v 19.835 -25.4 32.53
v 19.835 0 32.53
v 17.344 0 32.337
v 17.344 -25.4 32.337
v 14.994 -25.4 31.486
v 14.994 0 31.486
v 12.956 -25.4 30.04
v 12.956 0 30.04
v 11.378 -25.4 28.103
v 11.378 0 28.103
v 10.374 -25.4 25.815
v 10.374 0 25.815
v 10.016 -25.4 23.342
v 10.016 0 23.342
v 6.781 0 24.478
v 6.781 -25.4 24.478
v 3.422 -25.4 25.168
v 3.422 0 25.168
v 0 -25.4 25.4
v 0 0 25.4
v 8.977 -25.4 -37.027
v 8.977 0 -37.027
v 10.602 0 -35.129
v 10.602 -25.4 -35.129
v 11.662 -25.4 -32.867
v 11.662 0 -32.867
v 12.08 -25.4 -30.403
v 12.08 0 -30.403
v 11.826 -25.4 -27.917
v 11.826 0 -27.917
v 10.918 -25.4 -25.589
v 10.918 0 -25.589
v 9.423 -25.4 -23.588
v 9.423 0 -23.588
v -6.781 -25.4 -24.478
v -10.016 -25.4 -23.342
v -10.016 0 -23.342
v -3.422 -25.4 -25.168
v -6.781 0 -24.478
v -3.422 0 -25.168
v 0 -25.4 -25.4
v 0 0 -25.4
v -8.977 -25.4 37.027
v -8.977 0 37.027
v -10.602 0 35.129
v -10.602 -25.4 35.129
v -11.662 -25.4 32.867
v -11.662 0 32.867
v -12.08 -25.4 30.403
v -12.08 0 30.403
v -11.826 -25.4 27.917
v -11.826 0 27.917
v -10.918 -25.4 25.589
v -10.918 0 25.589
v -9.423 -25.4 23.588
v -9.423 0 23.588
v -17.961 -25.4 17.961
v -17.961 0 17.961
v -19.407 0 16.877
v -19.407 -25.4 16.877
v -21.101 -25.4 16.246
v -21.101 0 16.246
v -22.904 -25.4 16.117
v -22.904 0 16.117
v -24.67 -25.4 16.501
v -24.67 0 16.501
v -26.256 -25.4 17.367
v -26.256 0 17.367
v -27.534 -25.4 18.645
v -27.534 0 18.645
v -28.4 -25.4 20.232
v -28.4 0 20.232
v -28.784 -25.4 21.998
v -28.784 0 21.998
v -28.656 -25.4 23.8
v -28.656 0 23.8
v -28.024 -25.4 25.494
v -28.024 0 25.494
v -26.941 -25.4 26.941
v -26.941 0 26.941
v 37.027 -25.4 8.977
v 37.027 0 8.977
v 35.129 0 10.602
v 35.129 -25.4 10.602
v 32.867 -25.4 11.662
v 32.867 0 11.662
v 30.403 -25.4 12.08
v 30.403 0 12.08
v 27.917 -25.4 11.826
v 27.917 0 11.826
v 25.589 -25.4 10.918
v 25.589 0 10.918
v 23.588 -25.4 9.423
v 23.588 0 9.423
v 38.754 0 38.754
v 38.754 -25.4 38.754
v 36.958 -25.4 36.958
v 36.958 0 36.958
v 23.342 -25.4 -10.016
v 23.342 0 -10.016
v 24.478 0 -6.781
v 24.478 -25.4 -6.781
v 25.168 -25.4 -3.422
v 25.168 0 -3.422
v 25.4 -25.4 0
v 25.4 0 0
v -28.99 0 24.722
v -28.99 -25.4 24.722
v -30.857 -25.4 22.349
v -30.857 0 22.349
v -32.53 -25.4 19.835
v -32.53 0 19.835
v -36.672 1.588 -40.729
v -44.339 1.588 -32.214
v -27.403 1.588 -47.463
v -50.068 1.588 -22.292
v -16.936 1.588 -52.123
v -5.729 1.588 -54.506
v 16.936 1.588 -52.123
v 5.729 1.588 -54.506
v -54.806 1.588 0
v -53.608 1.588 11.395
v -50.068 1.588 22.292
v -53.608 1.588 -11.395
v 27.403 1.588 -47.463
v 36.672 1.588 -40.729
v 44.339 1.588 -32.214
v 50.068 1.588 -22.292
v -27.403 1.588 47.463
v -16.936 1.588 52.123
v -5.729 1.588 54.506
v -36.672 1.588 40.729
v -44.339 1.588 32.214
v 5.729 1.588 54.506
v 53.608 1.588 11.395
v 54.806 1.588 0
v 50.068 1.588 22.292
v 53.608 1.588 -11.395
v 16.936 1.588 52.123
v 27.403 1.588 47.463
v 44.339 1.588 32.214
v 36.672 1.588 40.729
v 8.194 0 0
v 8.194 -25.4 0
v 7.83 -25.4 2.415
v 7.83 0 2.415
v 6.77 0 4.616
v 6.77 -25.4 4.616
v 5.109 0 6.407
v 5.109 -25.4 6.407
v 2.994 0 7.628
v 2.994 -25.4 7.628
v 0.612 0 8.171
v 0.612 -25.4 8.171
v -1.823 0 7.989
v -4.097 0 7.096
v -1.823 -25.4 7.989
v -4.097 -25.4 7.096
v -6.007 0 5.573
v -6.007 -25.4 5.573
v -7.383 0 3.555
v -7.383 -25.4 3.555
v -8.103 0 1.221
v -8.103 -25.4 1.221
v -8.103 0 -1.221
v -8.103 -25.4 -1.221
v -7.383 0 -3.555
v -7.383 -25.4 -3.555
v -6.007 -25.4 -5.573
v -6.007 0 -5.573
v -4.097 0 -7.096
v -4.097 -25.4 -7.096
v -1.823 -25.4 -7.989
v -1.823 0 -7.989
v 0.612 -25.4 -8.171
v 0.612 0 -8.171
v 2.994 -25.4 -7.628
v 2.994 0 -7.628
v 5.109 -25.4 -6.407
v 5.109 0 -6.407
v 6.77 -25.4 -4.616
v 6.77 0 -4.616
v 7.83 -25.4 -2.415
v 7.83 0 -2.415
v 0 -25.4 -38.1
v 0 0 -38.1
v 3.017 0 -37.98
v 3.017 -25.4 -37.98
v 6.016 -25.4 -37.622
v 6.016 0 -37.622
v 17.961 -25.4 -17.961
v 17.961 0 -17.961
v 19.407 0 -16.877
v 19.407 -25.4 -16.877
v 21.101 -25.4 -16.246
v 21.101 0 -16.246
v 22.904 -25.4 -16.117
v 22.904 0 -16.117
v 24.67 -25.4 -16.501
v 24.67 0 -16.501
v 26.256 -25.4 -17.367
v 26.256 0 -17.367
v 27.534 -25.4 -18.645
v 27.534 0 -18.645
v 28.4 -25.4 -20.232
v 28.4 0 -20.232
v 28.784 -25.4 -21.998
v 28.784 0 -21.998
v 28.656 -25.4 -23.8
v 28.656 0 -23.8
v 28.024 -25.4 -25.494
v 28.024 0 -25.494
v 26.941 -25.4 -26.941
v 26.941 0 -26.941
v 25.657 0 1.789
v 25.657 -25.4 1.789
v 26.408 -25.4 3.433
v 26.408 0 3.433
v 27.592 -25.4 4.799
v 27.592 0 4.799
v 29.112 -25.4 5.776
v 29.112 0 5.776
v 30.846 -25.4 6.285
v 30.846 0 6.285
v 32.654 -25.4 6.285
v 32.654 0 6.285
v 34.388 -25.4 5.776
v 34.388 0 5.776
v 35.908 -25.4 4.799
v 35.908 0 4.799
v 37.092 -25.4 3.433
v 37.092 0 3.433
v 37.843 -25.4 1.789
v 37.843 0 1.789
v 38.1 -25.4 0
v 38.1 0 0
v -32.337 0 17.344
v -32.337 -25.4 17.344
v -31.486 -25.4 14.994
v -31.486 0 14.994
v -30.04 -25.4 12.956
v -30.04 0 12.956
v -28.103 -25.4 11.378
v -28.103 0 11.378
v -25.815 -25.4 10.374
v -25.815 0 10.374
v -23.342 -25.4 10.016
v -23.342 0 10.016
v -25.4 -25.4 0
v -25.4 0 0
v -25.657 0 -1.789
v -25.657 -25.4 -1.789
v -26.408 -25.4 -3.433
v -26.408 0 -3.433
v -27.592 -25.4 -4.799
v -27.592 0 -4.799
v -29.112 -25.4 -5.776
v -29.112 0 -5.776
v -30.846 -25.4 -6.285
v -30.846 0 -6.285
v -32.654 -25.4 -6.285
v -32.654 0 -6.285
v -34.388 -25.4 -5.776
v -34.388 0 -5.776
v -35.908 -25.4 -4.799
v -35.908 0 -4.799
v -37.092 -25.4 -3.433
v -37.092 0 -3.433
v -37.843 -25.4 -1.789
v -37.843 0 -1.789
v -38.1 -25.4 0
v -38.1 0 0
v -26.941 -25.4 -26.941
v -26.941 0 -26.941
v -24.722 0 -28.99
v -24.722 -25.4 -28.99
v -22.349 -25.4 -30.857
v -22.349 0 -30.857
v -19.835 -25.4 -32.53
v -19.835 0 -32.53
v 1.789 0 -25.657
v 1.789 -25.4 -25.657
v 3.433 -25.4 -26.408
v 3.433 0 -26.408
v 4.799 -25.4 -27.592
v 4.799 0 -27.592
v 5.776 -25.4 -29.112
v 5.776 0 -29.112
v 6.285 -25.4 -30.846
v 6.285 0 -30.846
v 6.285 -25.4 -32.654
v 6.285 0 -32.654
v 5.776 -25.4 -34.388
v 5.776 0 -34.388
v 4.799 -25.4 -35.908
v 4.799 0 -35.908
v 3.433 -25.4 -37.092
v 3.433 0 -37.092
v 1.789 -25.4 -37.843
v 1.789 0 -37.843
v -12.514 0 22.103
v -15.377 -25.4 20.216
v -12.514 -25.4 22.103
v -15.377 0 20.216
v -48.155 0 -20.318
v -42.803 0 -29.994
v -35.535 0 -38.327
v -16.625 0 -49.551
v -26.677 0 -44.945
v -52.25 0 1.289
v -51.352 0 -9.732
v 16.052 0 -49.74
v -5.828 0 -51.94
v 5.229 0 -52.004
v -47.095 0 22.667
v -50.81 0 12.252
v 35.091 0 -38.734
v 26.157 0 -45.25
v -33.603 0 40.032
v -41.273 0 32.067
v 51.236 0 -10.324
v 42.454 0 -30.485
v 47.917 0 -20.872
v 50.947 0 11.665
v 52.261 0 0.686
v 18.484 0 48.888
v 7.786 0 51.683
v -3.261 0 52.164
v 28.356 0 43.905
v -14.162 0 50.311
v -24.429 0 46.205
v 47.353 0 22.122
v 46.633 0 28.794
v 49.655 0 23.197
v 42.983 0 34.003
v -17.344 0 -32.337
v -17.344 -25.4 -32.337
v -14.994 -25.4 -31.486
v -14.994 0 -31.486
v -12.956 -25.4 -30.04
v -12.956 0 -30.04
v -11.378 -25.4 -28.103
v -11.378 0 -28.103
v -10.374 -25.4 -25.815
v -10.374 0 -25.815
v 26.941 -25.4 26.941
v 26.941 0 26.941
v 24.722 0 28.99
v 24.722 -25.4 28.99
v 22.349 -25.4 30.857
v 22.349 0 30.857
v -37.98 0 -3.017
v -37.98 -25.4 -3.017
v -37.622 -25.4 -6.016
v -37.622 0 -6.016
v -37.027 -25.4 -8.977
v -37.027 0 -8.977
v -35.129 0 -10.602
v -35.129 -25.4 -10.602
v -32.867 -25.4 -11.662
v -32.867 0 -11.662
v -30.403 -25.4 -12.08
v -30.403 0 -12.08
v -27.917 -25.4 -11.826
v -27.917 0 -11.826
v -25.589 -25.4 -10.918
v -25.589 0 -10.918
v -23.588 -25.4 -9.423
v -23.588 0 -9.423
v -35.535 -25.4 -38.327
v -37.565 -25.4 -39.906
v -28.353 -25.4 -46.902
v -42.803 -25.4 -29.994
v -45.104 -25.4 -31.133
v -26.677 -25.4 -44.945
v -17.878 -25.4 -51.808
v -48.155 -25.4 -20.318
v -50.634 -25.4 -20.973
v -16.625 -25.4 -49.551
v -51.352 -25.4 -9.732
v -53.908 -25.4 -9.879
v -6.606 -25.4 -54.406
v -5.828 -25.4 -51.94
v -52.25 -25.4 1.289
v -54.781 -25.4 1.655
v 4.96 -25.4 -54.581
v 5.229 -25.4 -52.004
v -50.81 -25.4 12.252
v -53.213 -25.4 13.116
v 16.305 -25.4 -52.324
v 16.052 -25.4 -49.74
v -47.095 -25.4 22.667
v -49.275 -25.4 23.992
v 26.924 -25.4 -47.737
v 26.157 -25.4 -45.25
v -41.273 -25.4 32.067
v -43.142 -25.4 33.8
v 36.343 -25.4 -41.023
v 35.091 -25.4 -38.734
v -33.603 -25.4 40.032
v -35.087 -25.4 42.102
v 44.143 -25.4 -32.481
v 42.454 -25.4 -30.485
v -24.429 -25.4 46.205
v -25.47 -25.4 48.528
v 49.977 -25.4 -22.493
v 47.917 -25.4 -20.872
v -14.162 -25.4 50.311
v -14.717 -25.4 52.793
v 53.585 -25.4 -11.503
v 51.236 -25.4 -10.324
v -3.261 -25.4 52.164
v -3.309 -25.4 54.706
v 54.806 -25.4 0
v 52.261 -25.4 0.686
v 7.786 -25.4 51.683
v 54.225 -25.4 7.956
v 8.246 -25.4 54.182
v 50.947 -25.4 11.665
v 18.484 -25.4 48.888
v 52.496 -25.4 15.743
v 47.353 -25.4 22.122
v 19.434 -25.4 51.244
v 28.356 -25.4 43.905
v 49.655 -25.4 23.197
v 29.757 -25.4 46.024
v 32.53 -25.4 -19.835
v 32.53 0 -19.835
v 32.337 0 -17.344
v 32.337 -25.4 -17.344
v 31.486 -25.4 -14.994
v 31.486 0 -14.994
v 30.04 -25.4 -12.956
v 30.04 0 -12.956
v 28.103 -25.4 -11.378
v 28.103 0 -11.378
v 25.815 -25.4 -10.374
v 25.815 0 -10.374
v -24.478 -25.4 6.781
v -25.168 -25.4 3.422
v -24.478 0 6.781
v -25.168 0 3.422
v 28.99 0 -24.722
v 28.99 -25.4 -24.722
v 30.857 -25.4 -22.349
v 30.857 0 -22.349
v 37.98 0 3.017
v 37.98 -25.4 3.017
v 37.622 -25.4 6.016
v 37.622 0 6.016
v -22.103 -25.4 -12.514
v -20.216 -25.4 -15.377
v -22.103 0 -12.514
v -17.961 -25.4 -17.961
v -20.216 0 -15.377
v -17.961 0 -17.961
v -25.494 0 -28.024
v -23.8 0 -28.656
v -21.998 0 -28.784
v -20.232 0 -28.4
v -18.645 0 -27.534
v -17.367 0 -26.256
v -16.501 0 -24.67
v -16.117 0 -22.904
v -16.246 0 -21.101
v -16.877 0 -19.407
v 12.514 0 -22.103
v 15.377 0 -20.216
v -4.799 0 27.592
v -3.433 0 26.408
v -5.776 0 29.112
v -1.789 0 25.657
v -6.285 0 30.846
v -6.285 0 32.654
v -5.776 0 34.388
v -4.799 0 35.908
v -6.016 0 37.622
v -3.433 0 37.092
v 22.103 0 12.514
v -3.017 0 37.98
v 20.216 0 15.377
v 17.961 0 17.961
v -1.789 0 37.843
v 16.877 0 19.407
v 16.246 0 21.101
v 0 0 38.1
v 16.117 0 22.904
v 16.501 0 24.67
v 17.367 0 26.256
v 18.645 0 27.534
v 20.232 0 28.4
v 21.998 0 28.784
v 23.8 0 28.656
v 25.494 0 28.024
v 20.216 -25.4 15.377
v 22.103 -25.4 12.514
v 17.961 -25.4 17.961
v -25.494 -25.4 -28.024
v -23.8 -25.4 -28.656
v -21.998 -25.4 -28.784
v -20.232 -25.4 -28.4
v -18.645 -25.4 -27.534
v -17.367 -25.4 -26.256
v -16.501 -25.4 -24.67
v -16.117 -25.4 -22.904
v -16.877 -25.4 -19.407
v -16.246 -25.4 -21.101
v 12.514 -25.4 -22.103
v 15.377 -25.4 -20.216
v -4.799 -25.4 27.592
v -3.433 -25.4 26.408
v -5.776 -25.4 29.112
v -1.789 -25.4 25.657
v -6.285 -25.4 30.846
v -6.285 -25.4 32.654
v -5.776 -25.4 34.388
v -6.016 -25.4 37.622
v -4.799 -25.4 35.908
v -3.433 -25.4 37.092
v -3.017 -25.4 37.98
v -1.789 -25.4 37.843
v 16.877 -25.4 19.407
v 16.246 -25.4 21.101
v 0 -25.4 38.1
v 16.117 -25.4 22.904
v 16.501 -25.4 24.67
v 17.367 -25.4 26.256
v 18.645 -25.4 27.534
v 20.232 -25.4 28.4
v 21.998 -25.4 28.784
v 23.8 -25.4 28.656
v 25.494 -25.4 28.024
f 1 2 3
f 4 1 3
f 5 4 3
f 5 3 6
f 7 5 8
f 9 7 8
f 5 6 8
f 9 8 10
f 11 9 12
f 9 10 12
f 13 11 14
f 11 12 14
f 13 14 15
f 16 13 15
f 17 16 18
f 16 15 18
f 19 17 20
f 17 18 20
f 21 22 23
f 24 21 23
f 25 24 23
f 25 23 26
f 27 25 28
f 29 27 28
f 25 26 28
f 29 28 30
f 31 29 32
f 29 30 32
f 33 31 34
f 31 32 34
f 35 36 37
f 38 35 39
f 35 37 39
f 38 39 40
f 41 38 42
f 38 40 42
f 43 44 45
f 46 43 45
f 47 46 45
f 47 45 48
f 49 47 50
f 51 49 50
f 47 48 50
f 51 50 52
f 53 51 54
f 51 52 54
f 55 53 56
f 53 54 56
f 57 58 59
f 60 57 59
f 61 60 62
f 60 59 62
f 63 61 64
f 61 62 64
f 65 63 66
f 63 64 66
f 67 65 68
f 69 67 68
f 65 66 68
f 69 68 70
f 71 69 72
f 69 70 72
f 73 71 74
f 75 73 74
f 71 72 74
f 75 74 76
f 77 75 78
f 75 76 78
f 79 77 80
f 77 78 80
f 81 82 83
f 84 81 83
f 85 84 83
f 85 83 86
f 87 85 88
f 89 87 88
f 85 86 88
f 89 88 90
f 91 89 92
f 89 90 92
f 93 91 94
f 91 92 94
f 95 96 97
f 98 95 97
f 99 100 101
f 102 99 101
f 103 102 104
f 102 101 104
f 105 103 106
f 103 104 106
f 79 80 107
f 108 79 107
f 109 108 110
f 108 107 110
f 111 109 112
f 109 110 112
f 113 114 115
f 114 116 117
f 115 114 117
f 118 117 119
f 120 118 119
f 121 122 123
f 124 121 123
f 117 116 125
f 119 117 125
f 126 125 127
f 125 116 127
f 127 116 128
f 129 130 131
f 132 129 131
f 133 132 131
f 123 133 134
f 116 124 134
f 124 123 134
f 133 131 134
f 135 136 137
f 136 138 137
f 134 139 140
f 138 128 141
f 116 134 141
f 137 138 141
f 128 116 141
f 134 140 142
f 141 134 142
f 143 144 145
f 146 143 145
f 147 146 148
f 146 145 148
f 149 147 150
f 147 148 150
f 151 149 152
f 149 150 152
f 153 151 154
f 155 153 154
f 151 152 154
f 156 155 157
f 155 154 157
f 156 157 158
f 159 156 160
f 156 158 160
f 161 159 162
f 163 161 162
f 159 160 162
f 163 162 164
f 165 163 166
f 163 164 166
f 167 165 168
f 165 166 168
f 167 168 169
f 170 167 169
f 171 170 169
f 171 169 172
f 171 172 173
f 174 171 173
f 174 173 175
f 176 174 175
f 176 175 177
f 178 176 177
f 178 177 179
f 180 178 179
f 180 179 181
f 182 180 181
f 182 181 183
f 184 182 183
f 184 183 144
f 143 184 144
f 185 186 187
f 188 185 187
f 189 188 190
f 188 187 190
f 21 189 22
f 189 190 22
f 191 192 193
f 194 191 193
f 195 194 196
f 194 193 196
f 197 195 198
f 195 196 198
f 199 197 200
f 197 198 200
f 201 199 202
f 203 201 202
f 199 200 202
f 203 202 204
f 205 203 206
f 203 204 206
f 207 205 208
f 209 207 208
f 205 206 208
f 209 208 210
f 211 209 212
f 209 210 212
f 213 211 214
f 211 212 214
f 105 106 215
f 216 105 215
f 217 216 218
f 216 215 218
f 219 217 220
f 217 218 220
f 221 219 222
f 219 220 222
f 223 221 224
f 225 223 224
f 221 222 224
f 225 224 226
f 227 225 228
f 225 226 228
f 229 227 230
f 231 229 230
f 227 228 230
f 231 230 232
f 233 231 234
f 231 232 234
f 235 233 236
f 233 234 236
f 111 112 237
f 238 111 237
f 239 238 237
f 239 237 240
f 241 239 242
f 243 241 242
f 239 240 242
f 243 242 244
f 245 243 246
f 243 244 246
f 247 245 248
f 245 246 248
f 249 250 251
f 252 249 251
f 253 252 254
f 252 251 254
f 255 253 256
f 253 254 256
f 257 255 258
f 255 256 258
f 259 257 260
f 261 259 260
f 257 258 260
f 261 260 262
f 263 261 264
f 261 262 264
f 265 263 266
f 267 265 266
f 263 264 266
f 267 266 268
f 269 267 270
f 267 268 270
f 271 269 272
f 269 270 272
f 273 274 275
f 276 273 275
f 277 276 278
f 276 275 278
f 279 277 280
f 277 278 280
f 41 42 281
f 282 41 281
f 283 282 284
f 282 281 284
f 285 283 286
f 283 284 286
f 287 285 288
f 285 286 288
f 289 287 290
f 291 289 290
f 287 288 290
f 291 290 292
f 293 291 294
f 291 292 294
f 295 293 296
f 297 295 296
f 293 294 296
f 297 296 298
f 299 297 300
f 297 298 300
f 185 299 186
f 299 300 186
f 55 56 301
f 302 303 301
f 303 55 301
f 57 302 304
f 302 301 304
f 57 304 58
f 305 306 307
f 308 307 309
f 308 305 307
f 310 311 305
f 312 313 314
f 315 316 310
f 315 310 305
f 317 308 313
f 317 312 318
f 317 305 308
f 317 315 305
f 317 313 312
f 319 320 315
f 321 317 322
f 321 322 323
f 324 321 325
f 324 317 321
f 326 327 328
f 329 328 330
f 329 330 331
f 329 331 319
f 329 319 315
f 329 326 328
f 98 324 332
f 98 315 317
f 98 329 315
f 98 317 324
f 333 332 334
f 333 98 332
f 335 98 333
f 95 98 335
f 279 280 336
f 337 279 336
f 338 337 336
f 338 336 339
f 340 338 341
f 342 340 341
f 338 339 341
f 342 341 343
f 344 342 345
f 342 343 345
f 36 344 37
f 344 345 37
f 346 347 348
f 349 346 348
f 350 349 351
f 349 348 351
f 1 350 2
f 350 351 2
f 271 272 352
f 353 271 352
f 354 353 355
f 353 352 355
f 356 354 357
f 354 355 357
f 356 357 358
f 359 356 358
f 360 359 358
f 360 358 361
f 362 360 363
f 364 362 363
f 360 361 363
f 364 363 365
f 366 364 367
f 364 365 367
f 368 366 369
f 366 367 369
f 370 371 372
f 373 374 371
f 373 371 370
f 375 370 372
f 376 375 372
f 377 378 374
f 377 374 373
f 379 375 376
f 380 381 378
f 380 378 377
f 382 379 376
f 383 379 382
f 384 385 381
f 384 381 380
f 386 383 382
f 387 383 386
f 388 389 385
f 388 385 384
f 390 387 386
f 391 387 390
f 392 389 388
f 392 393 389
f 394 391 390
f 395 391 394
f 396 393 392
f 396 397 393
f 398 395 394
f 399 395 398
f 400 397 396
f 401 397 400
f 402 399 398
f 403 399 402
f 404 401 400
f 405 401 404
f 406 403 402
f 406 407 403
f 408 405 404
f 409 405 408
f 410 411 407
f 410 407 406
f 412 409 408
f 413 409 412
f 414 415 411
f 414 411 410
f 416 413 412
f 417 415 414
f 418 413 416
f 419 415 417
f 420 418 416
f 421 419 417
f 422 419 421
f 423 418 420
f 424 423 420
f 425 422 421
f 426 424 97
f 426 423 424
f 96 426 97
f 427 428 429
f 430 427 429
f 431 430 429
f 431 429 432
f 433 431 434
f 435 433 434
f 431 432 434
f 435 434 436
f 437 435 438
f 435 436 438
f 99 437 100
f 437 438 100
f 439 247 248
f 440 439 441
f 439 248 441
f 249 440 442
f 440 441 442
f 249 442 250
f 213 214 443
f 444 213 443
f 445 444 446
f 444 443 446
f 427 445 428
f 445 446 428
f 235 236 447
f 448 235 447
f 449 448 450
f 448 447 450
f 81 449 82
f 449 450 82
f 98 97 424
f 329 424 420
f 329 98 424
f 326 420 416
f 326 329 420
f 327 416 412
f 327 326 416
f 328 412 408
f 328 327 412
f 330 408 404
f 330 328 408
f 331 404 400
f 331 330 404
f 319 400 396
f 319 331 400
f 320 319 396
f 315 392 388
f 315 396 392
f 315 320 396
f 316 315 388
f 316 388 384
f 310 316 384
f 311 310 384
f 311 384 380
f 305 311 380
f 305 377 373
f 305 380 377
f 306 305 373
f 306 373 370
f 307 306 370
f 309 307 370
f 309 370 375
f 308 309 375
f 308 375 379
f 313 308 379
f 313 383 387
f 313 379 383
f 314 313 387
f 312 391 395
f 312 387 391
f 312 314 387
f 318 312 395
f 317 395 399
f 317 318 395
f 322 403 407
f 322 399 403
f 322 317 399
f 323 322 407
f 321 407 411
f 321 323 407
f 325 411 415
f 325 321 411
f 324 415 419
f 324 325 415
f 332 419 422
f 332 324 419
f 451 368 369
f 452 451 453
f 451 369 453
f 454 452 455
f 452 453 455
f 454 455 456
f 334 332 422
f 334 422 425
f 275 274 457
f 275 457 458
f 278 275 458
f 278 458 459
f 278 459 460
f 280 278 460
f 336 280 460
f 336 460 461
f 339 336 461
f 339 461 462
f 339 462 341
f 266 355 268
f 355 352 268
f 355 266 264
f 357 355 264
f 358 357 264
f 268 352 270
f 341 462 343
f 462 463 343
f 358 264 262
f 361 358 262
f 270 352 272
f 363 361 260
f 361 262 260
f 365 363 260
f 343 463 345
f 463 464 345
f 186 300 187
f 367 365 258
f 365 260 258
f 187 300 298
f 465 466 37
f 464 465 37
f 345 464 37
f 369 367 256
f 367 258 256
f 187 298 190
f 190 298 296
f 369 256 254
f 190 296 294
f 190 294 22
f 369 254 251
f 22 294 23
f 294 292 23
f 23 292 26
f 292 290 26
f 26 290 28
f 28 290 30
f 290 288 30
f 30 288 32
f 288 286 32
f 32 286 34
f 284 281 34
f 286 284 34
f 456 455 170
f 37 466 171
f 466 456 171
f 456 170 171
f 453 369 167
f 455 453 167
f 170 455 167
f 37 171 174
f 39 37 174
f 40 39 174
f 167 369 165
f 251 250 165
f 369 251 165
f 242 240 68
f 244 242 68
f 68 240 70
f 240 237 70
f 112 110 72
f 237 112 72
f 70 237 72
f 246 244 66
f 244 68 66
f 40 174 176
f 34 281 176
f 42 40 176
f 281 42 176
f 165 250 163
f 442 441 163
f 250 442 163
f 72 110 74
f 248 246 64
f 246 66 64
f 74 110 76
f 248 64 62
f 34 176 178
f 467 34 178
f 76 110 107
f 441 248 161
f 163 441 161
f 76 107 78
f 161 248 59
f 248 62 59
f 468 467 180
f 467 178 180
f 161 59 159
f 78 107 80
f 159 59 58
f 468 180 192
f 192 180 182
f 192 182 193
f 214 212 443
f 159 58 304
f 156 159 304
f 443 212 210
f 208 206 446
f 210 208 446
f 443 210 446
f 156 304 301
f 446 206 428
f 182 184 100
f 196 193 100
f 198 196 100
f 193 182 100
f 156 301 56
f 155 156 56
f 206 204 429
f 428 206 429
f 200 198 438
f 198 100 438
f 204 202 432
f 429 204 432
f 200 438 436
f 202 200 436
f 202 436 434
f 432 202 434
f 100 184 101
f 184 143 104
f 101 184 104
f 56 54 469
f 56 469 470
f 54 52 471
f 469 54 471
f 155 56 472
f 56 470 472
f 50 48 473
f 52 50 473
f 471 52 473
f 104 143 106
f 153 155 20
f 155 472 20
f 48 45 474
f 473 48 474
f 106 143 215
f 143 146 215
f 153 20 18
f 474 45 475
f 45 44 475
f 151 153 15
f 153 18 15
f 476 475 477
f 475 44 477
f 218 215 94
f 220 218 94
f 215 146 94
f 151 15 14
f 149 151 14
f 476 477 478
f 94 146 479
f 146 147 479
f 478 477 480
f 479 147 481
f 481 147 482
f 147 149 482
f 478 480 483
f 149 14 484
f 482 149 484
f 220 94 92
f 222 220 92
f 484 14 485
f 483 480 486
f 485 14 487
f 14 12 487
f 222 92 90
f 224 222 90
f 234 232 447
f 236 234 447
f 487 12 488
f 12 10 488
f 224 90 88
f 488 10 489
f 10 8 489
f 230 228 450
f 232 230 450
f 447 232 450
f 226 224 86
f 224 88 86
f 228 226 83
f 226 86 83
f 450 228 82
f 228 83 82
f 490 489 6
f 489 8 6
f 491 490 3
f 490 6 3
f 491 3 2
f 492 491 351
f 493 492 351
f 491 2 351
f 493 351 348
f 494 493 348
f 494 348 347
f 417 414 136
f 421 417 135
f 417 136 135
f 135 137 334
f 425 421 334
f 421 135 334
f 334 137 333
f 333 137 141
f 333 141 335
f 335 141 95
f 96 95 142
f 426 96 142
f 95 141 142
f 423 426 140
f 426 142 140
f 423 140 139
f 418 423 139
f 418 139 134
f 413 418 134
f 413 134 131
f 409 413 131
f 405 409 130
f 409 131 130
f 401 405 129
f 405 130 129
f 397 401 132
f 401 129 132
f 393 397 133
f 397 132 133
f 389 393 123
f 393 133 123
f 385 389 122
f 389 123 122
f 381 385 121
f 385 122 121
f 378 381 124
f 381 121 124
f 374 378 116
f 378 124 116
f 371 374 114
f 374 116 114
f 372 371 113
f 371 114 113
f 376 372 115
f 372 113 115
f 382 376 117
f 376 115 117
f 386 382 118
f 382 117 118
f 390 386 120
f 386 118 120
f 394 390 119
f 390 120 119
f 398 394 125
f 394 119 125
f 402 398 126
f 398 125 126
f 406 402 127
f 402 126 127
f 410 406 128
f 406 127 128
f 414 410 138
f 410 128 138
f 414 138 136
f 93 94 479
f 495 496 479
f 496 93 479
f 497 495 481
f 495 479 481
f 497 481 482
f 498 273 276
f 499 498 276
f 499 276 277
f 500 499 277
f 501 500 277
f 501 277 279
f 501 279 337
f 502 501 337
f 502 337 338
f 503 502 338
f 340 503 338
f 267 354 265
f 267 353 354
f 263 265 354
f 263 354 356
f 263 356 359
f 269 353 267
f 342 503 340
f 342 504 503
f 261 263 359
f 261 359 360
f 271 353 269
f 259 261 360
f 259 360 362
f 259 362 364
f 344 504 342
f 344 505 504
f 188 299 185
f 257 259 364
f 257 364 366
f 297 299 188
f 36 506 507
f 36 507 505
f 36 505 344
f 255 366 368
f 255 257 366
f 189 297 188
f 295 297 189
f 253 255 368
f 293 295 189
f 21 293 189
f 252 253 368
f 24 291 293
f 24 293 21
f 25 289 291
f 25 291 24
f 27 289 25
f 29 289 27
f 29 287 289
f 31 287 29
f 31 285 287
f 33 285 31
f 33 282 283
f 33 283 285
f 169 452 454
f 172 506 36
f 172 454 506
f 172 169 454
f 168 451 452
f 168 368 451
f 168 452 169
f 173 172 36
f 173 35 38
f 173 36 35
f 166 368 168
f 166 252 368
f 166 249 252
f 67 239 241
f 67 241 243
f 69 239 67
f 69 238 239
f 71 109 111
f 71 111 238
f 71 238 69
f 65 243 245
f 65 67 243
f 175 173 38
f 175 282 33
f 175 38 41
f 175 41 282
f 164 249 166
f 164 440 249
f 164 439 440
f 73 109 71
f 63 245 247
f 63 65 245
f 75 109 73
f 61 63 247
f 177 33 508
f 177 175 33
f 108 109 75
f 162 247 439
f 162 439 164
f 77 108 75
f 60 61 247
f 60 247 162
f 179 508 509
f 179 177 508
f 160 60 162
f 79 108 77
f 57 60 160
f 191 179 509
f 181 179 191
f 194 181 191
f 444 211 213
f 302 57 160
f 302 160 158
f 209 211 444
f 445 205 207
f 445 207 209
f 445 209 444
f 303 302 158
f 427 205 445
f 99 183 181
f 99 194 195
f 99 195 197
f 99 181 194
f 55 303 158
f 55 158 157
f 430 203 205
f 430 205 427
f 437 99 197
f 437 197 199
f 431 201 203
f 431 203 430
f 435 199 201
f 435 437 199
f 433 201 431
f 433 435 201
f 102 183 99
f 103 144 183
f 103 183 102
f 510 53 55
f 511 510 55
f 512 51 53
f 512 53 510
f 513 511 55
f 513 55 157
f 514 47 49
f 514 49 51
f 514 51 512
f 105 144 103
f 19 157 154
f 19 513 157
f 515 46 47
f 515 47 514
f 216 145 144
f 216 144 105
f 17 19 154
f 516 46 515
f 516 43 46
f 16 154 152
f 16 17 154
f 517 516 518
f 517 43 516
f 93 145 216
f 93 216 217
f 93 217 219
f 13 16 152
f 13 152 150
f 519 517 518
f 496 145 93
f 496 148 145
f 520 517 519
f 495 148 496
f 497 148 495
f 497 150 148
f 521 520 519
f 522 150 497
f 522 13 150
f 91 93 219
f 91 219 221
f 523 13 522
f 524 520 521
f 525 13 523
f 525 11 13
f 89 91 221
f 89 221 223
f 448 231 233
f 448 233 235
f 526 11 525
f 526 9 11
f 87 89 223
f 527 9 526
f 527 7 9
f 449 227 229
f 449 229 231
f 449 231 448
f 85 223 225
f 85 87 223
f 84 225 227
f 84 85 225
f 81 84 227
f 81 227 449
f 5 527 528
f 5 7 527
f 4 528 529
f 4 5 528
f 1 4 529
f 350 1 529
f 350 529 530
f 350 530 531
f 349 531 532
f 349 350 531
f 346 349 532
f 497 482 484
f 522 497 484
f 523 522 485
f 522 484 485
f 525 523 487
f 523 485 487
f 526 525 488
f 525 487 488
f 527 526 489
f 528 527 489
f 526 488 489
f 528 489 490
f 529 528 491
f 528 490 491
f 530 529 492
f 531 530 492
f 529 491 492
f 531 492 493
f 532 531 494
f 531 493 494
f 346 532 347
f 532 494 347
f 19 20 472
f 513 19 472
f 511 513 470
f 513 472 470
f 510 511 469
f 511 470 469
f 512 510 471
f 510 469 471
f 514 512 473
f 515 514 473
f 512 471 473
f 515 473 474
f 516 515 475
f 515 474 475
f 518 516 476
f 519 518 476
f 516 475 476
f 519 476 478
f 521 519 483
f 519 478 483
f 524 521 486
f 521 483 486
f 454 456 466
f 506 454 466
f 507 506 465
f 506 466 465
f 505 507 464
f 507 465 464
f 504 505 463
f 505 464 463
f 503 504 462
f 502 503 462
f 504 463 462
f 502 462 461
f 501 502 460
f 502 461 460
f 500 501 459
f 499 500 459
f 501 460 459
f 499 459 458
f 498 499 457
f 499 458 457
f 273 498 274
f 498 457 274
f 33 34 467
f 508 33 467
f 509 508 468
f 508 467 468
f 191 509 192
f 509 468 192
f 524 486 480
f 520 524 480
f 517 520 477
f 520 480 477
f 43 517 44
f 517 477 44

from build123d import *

# Parameters (mm, degrees)
F0_R            = 25.4
F1_DEPTH        = 25.4
F3_DEPTH        = 25.4
F3_COPIES_COUNT = 8
F5_R            = 54.8058055475
F6_DEPTH        = 1.5875
F7_R            = 54.8058055475
F7_R_2          = 52.2658055475
F8_DEPTH        = 25.4
F9_R            = 8.1942220896
F10_DEPTH       = 26.9885
F12_DEPTH       = 25.4


# Not quite as in the source:
# - a pattern or mirror of a feature is missing from the dataset's text; its kind, count and spacing are read off the source's solid


with BuildPart() as f1:
    # F0 (on Front) → F1 (new body)
    with BuildSketch(Plane.XZ):
        Circle(F0_R)
    extrude(amount=F1_DEPTH)

    # F2 (on Front) → F3 (join, through all)
    with BuildSketch(Plane.XZ):
        with BuildLine():
            ThreePointArc((0, 25.4), (-6.35, 31.75), (0, 38.1))
            ThreePointArc((0, 38.1), (-4.5202939278, 37.8308993127), (-8.9767340917, 37.0273985725))
            ThreePointArc((-8.9767340917, 37.0273985725), (-12.0799901727, 30.403051734), (-9.4225081919, 23.5876310674))
            ThreePointArc((-9.4225081919, 23.5876310674), (-4.7976124733, 24.9427928379), (0, 25.4))
        make_face()
    f3 = extrude(amount=F3_DEPTH)

    # F3_copies: F3 ×8 about axis
    f3_copies_axis = Axis((0, 0, 0), (0, 1, 0))
    for i in range(1, F3_COPIES_COUNT):
        add(f3.rotate(f3_copies_axis, i * 360 / F3_COPIES_COUNT))

    # F9 (on face) → F10 (cut, through all)
    with BuildSketch(Plane.XZ.offset(25.4)):
        Circle(F9_R)
    extrude(amount=-F10_DEPTH, mode=Mode.SUBTRACT)


with BuildPart() as f6:
    # F5 (on Front) → F6 (new body)
    with BuildSketch(Plane.XZ):
        Circle(F5_R)
    extrude(amount=-F6_DEPTH)

    # F7 (on face) → F8 (join)
    with BuildSketch(Plane.XZ):
        Circle(F7_R)
        Circle(F7_R_2, mode=Mode.SUBTRACT)
    extrude(amount=F8_DEPTH)

    # F11 (on face) → F12 (cut, through all)
    with BuildSketch(Plane.XZ):
        with BuildLine():
            Line((47.3533162762, 22.1218866098), (49.6545804025, 23.1969602914))
            ThreePointArc((49.6545804025, 23.1969602914), (44.8831995527, 31.4511481447), (38.753556751, 38.753556751))
            Line((38.753556751, 38.753556751), (36.9575055268, 36.9575055268))
            ThreePointArc((36.9575055268, 36.9575055268), (42.8030672433, 29.9935303706), (47.3533162762, 22.1218866098))
        make_face()
    extrude(amount=F12_DEPTH, mode=Mode.SUBTRACT)


solid = Compound([f1.part, f6.part])
